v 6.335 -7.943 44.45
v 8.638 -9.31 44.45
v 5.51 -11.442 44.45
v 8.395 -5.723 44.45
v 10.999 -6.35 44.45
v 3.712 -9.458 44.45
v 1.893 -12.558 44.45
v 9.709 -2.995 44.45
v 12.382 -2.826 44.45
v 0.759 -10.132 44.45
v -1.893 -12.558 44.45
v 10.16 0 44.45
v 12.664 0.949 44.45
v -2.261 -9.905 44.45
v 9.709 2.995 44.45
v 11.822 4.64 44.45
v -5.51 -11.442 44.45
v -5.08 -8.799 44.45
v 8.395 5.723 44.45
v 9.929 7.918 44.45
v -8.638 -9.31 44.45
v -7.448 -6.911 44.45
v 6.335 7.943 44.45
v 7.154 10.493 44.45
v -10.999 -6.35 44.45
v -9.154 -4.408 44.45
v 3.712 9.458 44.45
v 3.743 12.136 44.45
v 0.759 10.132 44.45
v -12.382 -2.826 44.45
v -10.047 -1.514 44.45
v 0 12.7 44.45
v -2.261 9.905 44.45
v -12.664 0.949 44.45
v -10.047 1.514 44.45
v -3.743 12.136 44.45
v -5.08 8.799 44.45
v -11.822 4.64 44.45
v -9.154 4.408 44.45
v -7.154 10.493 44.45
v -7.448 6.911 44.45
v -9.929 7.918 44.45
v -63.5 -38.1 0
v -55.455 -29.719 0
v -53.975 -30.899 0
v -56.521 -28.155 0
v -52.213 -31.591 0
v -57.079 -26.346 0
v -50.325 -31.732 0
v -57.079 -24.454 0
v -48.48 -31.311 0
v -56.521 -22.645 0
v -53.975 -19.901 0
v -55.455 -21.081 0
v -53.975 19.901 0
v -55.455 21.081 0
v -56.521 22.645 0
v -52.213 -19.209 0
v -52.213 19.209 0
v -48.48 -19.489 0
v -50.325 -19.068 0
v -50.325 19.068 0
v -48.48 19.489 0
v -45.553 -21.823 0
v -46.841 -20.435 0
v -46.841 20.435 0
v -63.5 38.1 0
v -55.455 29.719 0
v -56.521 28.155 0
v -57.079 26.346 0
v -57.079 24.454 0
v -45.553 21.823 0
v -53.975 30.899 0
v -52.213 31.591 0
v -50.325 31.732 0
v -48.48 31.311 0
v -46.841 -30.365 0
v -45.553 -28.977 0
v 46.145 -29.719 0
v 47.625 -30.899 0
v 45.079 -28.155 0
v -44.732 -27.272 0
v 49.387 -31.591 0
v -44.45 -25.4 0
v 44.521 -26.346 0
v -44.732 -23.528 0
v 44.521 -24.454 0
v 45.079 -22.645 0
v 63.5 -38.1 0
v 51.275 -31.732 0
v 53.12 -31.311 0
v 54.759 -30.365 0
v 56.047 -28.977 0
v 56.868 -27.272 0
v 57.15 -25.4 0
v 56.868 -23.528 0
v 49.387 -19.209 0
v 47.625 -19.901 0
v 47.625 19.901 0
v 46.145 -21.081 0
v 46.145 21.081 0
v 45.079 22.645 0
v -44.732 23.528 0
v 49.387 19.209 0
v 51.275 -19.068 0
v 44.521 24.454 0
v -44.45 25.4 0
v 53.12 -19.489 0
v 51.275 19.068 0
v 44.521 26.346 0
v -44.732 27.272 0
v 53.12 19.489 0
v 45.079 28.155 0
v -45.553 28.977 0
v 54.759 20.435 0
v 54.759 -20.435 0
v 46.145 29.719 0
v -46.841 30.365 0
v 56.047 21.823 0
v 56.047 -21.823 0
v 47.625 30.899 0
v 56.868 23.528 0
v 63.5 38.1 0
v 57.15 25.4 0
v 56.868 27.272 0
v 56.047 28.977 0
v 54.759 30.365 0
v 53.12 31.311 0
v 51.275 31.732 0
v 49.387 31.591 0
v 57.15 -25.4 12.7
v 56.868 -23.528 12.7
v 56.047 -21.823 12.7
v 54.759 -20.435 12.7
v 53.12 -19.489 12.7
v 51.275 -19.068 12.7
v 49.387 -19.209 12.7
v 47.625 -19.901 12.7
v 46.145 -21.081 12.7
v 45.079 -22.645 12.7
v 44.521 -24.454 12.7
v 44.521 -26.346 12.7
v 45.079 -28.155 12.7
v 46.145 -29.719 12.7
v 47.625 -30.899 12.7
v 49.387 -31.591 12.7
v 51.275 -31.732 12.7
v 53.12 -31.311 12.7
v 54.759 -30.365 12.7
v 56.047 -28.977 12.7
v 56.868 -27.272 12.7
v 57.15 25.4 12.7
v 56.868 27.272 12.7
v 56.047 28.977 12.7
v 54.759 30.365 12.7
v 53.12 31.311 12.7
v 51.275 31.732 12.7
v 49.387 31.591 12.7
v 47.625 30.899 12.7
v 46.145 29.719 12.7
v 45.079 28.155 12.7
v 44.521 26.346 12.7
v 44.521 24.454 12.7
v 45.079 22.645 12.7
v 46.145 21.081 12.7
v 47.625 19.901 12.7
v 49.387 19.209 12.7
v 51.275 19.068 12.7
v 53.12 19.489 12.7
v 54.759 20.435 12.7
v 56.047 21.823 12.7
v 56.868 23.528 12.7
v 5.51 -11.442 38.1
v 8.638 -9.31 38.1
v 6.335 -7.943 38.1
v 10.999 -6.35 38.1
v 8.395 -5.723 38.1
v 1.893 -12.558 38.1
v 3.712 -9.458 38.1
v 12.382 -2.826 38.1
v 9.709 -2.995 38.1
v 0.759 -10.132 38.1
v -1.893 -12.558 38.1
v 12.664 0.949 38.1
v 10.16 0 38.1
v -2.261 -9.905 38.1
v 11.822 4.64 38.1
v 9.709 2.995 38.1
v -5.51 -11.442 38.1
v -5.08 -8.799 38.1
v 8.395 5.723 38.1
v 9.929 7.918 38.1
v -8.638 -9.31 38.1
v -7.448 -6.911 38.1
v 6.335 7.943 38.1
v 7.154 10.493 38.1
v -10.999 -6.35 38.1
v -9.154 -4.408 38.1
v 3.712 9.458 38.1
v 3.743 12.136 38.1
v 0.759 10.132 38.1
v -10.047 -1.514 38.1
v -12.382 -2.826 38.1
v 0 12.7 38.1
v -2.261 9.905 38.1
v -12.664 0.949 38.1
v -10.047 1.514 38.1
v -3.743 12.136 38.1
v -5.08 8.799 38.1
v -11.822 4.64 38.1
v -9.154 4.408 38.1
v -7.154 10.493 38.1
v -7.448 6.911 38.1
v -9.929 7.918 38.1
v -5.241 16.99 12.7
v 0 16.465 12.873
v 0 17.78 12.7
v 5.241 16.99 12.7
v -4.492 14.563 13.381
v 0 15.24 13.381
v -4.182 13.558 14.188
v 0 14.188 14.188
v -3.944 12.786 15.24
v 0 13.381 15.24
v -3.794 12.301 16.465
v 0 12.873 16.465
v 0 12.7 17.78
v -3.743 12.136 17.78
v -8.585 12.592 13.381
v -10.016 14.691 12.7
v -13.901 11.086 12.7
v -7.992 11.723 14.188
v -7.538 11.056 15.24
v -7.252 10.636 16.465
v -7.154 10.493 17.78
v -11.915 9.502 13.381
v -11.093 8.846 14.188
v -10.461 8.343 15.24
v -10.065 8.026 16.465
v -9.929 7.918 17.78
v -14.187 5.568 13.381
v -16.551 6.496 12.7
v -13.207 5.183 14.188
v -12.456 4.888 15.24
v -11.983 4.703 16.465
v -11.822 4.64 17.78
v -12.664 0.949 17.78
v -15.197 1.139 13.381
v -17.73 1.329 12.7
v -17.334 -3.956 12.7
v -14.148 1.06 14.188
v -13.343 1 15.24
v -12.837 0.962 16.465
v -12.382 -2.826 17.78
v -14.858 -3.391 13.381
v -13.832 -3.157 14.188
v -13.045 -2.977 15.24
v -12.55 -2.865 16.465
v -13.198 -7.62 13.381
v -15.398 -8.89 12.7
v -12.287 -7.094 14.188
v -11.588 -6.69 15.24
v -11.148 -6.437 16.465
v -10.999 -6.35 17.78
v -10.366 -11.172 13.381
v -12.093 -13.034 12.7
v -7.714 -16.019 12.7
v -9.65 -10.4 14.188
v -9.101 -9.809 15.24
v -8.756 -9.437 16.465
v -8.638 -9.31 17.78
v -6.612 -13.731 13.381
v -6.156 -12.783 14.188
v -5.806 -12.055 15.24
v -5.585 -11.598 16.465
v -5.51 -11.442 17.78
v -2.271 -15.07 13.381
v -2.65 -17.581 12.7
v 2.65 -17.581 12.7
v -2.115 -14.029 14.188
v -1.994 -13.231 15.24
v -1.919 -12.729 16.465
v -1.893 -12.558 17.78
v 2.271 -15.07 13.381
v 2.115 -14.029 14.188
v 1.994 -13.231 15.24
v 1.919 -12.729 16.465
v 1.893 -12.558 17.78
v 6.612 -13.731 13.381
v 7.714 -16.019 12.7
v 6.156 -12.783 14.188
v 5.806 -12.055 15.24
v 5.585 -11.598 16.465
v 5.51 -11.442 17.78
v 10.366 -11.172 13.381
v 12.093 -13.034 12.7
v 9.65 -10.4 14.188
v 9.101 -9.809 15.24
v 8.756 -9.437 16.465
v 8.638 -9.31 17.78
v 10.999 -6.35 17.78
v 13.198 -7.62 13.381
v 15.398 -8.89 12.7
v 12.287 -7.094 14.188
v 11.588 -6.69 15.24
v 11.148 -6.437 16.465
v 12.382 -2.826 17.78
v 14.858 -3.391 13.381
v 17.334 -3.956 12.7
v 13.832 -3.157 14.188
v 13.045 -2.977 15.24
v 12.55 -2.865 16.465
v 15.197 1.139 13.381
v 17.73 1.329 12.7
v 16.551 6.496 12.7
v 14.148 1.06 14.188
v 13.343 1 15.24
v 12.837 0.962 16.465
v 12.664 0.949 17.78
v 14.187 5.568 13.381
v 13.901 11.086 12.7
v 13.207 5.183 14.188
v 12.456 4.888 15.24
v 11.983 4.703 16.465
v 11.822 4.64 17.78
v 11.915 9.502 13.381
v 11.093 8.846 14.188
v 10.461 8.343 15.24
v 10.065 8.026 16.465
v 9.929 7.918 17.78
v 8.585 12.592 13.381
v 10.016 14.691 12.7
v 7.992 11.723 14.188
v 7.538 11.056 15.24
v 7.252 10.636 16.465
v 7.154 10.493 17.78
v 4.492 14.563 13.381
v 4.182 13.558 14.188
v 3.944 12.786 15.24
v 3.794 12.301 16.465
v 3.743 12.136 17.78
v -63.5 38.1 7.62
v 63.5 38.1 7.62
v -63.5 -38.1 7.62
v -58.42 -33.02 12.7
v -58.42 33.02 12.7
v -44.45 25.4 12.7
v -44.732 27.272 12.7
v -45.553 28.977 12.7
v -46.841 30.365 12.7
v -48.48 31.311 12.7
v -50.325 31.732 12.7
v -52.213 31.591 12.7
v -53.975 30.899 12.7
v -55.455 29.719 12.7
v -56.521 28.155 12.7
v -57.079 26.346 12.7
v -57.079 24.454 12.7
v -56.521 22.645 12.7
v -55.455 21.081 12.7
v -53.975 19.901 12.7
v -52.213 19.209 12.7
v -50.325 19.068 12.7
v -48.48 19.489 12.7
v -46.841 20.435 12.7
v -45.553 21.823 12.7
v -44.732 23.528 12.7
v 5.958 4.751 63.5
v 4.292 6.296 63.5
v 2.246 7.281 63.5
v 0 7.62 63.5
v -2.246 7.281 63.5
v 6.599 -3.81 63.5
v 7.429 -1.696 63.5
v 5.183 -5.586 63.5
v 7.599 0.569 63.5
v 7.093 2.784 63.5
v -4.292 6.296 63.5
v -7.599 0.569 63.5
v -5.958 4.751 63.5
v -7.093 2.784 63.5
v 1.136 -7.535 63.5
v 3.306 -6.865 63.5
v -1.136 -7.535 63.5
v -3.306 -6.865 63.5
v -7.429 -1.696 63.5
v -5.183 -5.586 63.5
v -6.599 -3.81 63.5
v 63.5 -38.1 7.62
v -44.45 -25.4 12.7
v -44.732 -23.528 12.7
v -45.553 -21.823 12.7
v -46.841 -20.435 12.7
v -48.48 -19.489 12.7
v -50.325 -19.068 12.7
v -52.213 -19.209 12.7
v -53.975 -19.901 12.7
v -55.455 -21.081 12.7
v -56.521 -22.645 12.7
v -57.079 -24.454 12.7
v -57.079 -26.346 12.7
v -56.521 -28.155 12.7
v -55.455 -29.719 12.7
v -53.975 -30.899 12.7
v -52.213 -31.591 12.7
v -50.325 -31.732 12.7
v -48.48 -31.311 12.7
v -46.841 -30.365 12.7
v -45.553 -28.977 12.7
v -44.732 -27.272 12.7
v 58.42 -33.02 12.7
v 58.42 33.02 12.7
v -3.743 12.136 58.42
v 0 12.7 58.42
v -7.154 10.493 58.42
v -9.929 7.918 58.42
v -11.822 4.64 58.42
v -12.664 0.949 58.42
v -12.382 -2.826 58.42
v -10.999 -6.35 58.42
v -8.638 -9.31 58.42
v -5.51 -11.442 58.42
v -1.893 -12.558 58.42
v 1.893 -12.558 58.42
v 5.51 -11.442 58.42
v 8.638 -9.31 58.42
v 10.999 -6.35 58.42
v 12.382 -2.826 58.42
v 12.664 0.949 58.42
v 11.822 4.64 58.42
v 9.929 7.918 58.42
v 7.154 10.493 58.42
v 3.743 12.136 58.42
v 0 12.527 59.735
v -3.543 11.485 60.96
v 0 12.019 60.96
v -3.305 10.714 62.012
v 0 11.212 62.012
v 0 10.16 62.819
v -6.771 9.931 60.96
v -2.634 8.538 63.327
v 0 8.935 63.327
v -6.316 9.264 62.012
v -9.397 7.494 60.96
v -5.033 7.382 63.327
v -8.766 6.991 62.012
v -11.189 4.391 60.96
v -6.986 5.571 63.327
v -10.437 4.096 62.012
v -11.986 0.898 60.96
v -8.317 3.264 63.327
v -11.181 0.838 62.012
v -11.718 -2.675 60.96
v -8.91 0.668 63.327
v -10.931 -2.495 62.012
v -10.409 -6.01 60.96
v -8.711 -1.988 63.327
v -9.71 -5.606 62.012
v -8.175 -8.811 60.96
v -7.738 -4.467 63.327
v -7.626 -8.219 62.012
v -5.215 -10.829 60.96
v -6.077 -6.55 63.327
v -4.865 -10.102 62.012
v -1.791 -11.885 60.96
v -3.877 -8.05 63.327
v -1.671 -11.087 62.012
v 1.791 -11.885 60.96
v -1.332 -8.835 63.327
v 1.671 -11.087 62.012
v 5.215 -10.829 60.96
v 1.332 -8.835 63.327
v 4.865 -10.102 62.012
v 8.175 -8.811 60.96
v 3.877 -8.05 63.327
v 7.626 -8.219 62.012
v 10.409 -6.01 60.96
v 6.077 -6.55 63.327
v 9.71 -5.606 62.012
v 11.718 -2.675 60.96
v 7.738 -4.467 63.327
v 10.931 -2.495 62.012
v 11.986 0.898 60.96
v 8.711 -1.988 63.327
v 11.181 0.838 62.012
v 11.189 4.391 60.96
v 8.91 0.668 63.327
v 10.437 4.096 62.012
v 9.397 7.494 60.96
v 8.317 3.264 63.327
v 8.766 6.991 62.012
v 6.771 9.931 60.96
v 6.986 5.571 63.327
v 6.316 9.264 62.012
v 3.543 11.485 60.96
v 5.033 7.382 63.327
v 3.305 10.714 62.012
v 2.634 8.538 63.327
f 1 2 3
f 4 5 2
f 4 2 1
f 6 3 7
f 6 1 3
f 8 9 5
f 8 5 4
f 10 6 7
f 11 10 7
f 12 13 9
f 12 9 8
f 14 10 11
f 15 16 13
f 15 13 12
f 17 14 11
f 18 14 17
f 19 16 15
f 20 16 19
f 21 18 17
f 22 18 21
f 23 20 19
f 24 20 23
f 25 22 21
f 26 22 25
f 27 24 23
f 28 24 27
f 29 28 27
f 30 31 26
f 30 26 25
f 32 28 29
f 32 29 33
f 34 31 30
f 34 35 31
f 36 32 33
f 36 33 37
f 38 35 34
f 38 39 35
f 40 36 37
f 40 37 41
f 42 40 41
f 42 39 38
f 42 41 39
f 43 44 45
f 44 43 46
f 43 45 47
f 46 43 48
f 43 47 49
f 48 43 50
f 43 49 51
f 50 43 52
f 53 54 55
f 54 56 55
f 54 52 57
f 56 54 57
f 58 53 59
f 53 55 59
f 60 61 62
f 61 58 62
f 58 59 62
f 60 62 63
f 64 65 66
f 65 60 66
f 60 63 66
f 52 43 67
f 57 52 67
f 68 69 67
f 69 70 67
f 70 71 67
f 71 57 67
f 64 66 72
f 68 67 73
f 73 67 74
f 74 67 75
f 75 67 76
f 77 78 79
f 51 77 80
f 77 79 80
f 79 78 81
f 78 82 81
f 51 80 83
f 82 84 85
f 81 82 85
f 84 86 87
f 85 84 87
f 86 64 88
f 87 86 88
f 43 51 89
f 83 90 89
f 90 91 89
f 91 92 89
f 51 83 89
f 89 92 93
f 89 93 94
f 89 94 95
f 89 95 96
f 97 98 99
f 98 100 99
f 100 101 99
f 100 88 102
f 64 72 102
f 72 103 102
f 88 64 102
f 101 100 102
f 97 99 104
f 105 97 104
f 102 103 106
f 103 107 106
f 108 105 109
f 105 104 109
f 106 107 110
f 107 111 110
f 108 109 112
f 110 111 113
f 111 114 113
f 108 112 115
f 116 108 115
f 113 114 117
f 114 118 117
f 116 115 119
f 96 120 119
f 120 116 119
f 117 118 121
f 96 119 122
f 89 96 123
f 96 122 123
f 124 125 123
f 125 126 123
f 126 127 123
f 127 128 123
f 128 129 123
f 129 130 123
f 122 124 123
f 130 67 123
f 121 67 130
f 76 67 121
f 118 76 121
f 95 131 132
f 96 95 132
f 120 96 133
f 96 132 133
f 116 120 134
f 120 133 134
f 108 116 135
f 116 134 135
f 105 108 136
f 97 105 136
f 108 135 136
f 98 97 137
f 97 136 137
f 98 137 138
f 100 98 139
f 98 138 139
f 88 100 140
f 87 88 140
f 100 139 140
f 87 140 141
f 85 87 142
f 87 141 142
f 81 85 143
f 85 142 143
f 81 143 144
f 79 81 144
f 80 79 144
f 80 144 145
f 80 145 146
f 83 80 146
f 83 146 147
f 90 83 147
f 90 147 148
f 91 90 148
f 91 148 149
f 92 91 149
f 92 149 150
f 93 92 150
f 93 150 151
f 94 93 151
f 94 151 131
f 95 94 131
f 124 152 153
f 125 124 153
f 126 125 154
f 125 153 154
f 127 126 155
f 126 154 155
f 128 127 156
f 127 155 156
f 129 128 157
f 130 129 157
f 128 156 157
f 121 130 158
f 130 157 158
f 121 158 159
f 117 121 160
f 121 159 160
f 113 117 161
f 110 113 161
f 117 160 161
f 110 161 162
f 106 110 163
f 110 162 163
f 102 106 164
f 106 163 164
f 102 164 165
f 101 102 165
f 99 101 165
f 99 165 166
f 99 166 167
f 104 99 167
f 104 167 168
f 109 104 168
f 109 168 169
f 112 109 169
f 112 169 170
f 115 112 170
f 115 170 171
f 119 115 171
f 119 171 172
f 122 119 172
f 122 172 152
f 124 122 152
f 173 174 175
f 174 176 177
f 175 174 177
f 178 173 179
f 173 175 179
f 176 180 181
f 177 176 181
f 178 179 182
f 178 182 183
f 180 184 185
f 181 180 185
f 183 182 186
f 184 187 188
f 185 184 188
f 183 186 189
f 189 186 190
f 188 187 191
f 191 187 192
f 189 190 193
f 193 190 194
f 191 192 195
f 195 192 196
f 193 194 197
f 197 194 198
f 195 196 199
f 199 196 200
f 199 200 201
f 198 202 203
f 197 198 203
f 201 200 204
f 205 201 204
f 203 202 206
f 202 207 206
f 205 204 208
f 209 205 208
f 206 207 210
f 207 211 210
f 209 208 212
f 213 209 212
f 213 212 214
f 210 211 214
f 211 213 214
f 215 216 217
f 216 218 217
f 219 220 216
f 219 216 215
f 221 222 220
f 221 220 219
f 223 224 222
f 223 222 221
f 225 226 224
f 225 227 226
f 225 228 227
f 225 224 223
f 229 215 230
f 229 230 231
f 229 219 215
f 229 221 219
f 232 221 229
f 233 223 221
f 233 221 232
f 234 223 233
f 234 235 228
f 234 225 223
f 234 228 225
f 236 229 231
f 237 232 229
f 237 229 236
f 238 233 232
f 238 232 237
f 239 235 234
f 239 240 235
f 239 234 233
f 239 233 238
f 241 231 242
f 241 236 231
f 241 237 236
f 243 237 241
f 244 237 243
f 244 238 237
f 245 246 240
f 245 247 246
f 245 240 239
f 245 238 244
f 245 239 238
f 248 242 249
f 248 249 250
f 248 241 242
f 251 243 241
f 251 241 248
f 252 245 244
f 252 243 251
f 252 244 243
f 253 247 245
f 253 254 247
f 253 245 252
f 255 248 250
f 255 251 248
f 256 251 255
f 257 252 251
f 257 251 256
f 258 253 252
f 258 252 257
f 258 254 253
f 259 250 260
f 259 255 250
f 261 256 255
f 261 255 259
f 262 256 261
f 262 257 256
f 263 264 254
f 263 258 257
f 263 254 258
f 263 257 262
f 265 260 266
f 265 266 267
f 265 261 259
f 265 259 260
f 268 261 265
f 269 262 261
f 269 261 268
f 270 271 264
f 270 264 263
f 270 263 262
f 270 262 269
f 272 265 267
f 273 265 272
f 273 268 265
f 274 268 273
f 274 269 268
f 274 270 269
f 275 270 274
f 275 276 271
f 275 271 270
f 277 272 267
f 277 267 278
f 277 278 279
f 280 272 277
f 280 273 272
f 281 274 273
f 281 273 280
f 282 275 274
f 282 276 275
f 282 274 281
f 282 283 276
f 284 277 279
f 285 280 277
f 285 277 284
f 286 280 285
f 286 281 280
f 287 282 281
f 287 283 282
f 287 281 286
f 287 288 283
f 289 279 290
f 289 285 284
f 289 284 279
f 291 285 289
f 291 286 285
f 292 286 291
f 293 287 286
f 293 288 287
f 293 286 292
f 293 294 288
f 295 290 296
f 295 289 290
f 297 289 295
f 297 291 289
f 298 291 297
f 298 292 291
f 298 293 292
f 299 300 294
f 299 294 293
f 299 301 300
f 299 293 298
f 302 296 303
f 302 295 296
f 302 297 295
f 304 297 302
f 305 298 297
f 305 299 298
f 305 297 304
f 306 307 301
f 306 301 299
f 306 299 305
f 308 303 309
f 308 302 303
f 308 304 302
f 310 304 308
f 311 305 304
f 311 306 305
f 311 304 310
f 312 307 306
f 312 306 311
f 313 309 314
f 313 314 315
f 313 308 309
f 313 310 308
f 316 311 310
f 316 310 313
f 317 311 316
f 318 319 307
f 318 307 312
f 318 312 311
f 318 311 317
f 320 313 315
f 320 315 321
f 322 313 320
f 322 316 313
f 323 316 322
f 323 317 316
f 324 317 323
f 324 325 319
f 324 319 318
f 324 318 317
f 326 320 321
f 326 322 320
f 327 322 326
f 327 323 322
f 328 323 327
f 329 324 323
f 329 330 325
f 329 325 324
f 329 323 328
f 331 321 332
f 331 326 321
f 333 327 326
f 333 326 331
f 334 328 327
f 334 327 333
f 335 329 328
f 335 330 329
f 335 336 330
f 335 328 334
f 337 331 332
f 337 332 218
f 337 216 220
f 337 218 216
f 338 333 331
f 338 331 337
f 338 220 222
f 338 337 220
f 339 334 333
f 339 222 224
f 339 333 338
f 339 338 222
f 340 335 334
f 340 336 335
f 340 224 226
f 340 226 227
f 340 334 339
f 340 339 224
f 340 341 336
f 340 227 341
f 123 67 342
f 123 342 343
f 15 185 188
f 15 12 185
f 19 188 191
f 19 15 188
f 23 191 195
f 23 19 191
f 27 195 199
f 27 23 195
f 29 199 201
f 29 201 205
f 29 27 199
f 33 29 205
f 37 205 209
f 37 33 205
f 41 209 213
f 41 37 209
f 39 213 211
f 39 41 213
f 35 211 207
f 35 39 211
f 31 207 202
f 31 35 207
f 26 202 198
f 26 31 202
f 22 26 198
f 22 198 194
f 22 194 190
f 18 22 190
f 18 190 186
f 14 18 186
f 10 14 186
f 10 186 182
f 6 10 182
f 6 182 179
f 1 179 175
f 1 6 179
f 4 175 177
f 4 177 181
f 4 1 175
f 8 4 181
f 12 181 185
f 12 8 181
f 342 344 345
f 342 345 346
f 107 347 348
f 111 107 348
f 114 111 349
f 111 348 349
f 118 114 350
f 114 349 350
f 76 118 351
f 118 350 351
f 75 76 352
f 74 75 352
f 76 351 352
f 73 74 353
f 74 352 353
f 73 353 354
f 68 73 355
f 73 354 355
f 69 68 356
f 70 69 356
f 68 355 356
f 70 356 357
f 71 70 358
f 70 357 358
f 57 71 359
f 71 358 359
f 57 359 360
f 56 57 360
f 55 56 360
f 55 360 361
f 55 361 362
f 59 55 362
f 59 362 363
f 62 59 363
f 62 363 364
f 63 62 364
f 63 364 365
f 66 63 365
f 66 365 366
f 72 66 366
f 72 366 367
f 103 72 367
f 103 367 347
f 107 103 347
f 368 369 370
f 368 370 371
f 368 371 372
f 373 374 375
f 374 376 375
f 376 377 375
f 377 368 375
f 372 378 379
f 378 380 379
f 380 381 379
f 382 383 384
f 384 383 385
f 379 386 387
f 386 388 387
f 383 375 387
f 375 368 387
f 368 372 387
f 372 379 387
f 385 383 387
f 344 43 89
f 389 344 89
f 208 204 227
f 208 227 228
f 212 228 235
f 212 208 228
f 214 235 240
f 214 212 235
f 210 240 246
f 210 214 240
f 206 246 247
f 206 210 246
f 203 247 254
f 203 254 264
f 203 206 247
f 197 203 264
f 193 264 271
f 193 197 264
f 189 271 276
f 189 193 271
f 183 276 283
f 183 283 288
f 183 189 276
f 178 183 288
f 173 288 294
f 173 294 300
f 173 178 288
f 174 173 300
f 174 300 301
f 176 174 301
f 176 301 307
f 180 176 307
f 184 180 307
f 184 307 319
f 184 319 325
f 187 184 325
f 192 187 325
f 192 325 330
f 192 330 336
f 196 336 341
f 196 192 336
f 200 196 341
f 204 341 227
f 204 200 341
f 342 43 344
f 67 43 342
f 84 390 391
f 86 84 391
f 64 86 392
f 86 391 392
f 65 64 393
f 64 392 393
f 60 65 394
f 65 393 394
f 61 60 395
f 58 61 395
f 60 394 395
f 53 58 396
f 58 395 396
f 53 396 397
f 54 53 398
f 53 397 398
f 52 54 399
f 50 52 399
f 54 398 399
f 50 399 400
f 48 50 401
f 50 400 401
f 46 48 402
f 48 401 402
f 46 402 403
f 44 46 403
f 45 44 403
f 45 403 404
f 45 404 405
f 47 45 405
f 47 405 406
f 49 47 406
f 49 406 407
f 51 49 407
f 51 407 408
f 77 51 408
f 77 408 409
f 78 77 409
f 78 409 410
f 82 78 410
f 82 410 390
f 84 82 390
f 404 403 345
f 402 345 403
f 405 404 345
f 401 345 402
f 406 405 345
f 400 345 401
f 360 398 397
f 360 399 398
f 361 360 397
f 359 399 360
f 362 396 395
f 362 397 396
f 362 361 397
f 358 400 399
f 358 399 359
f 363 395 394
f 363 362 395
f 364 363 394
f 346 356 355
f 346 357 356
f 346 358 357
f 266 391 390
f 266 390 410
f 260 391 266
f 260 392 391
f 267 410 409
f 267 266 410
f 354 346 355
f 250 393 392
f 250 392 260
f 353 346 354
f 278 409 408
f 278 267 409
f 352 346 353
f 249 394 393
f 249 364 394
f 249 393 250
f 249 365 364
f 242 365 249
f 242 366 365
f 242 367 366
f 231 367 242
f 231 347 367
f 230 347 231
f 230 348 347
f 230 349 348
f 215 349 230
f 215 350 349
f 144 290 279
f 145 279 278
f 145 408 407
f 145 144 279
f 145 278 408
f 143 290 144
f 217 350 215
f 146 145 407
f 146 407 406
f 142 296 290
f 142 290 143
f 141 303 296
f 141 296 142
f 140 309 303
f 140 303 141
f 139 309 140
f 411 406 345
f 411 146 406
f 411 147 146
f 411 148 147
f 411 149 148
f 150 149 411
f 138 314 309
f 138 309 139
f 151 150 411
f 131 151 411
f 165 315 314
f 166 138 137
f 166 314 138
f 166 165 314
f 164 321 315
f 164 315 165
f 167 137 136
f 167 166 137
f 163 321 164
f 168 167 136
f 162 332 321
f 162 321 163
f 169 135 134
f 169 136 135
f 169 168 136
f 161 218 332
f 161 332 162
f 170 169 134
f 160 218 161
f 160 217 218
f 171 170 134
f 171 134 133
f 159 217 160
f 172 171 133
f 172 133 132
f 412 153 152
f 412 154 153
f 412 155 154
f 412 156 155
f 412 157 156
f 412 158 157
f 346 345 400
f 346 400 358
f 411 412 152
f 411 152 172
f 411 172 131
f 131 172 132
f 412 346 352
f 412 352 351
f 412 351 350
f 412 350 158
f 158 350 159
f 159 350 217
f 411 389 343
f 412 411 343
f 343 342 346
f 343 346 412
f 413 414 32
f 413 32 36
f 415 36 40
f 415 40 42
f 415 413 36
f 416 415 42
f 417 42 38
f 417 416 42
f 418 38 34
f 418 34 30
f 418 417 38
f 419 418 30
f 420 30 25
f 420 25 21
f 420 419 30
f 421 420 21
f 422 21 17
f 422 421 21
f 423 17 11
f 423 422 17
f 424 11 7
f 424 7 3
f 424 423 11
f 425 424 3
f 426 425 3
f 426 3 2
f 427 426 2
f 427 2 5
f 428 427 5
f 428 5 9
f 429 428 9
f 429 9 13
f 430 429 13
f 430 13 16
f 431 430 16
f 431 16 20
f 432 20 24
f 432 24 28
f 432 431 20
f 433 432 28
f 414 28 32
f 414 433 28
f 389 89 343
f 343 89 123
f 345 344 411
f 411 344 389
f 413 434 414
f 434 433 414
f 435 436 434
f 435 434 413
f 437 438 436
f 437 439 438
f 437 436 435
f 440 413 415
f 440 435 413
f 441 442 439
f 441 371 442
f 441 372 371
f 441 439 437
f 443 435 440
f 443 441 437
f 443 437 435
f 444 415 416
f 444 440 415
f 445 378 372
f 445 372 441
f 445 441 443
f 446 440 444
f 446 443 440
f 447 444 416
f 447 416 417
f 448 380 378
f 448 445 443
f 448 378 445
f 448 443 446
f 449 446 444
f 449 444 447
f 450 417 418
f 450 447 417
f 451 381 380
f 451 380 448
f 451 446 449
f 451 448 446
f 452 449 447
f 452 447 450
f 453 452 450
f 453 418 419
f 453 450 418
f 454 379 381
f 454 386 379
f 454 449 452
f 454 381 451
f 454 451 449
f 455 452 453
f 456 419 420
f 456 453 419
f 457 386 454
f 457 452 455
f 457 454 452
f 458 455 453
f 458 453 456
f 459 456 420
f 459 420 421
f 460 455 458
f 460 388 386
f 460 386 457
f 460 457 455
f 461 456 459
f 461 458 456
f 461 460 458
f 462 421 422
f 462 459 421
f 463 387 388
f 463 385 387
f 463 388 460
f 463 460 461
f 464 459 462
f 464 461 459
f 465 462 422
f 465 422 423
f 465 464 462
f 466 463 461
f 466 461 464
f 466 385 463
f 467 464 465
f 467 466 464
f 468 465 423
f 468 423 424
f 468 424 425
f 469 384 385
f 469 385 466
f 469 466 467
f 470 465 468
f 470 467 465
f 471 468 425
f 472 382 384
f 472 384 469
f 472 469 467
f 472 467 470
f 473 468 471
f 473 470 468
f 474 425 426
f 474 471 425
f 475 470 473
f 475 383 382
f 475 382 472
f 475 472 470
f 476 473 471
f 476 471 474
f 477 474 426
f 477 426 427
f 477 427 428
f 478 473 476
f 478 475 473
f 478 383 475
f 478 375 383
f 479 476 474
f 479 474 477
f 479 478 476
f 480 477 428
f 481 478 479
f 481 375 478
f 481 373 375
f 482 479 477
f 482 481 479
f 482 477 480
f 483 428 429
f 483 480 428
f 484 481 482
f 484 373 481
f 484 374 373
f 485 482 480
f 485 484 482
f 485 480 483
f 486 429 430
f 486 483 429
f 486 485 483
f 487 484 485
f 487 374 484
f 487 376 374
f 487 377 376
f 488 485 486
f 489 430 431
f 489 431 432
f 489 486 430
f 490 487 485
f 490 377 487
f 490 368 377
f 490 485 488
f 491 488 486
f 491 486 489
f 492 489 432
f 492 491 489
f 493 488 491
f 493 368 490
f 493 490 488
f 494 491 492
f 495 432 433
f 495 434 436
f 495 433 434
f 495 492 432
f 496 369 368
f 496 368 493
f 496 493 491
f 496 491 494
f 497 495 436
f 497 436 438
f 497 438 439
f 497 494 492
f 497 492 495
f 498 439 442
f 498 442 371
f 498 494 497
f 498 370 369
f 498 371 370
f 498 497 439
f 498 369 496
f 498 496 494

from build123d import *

# Parameters (mm, degrees)
F0_W     = 127
F0_H     = 76.2
F1_DEPTH = 12.7
F2_R     = 6.35
F3_DEPTH = 12.701
F4_W     = 12.7
F4_H     = 50.8
F6_W     = 9.855053
F6_H     = 6.35
F8_R     = 5.08
F9_SIZE  = 5.08


with BuildPart() as f1:
    # F0 (on Top) → F1 (new body)
    with BuildSketch(Plane.XY):
        Rectangle(F0_W, F0_H)
    extrude(amount=F1_DEPTH)

    # F2 (on face) → F3 (cut, through all)
    with BuildSketch(Plane.XY.offset(12.7)):
        with Locations((-50.8, 25.4)):
            Circle(F2_R)
        with Locations((50.8, 25.4)):
            Circle(F2_R)
        with Locations((-50.8, -25.4)):
            Circle(F2_R)
        with Locations((50.8, -25.4)):
            Circle(F2_R)
    extrude(amount=-F3_DEPTH, mode=Mode.SUBTRACT)

    # F4 (on Right) → F5 (revolve)
    with BuildSketch(Plane.YZ):
        with Locations((6.35, 38.1)):
            Rectangle(F4_W, F4_H)
    revolve(axis=Axis((0, 0, 38.1), (0, 0, 1)))

    # F6 (on Front) → F7 (revolve, cut)
    with BuildSketch(Plane.XZ):
        with Locations((15.087526, 41.275)):
            Rectangle(F6_W, F6_H)
    revolve(axis=Axis((0, 0, 12.7), (0, 0, 1)), mode=Mode.SUBTRACT)

    # F8
    f8_edges = [f1.edges().sort_by_distance(p)[0] for p in [
        (0, -12.7, 12.7),
        (0, -12.7, 63.5),
    ]]
    fillet(f8_edges, radius=F8_R)

    # F9
    f9_edges = [f1.edges().sort_by_distance(p)[0] for p in [
        (-63.5, 0, 12.7),
        (0, -38.1, 12.7),
        (63.5, 0, 12.7),
        (0, 38.1, 12.7),
    ]]
    chamfer(f9_edges, length=F9_SIZE)


solid = f1.part
